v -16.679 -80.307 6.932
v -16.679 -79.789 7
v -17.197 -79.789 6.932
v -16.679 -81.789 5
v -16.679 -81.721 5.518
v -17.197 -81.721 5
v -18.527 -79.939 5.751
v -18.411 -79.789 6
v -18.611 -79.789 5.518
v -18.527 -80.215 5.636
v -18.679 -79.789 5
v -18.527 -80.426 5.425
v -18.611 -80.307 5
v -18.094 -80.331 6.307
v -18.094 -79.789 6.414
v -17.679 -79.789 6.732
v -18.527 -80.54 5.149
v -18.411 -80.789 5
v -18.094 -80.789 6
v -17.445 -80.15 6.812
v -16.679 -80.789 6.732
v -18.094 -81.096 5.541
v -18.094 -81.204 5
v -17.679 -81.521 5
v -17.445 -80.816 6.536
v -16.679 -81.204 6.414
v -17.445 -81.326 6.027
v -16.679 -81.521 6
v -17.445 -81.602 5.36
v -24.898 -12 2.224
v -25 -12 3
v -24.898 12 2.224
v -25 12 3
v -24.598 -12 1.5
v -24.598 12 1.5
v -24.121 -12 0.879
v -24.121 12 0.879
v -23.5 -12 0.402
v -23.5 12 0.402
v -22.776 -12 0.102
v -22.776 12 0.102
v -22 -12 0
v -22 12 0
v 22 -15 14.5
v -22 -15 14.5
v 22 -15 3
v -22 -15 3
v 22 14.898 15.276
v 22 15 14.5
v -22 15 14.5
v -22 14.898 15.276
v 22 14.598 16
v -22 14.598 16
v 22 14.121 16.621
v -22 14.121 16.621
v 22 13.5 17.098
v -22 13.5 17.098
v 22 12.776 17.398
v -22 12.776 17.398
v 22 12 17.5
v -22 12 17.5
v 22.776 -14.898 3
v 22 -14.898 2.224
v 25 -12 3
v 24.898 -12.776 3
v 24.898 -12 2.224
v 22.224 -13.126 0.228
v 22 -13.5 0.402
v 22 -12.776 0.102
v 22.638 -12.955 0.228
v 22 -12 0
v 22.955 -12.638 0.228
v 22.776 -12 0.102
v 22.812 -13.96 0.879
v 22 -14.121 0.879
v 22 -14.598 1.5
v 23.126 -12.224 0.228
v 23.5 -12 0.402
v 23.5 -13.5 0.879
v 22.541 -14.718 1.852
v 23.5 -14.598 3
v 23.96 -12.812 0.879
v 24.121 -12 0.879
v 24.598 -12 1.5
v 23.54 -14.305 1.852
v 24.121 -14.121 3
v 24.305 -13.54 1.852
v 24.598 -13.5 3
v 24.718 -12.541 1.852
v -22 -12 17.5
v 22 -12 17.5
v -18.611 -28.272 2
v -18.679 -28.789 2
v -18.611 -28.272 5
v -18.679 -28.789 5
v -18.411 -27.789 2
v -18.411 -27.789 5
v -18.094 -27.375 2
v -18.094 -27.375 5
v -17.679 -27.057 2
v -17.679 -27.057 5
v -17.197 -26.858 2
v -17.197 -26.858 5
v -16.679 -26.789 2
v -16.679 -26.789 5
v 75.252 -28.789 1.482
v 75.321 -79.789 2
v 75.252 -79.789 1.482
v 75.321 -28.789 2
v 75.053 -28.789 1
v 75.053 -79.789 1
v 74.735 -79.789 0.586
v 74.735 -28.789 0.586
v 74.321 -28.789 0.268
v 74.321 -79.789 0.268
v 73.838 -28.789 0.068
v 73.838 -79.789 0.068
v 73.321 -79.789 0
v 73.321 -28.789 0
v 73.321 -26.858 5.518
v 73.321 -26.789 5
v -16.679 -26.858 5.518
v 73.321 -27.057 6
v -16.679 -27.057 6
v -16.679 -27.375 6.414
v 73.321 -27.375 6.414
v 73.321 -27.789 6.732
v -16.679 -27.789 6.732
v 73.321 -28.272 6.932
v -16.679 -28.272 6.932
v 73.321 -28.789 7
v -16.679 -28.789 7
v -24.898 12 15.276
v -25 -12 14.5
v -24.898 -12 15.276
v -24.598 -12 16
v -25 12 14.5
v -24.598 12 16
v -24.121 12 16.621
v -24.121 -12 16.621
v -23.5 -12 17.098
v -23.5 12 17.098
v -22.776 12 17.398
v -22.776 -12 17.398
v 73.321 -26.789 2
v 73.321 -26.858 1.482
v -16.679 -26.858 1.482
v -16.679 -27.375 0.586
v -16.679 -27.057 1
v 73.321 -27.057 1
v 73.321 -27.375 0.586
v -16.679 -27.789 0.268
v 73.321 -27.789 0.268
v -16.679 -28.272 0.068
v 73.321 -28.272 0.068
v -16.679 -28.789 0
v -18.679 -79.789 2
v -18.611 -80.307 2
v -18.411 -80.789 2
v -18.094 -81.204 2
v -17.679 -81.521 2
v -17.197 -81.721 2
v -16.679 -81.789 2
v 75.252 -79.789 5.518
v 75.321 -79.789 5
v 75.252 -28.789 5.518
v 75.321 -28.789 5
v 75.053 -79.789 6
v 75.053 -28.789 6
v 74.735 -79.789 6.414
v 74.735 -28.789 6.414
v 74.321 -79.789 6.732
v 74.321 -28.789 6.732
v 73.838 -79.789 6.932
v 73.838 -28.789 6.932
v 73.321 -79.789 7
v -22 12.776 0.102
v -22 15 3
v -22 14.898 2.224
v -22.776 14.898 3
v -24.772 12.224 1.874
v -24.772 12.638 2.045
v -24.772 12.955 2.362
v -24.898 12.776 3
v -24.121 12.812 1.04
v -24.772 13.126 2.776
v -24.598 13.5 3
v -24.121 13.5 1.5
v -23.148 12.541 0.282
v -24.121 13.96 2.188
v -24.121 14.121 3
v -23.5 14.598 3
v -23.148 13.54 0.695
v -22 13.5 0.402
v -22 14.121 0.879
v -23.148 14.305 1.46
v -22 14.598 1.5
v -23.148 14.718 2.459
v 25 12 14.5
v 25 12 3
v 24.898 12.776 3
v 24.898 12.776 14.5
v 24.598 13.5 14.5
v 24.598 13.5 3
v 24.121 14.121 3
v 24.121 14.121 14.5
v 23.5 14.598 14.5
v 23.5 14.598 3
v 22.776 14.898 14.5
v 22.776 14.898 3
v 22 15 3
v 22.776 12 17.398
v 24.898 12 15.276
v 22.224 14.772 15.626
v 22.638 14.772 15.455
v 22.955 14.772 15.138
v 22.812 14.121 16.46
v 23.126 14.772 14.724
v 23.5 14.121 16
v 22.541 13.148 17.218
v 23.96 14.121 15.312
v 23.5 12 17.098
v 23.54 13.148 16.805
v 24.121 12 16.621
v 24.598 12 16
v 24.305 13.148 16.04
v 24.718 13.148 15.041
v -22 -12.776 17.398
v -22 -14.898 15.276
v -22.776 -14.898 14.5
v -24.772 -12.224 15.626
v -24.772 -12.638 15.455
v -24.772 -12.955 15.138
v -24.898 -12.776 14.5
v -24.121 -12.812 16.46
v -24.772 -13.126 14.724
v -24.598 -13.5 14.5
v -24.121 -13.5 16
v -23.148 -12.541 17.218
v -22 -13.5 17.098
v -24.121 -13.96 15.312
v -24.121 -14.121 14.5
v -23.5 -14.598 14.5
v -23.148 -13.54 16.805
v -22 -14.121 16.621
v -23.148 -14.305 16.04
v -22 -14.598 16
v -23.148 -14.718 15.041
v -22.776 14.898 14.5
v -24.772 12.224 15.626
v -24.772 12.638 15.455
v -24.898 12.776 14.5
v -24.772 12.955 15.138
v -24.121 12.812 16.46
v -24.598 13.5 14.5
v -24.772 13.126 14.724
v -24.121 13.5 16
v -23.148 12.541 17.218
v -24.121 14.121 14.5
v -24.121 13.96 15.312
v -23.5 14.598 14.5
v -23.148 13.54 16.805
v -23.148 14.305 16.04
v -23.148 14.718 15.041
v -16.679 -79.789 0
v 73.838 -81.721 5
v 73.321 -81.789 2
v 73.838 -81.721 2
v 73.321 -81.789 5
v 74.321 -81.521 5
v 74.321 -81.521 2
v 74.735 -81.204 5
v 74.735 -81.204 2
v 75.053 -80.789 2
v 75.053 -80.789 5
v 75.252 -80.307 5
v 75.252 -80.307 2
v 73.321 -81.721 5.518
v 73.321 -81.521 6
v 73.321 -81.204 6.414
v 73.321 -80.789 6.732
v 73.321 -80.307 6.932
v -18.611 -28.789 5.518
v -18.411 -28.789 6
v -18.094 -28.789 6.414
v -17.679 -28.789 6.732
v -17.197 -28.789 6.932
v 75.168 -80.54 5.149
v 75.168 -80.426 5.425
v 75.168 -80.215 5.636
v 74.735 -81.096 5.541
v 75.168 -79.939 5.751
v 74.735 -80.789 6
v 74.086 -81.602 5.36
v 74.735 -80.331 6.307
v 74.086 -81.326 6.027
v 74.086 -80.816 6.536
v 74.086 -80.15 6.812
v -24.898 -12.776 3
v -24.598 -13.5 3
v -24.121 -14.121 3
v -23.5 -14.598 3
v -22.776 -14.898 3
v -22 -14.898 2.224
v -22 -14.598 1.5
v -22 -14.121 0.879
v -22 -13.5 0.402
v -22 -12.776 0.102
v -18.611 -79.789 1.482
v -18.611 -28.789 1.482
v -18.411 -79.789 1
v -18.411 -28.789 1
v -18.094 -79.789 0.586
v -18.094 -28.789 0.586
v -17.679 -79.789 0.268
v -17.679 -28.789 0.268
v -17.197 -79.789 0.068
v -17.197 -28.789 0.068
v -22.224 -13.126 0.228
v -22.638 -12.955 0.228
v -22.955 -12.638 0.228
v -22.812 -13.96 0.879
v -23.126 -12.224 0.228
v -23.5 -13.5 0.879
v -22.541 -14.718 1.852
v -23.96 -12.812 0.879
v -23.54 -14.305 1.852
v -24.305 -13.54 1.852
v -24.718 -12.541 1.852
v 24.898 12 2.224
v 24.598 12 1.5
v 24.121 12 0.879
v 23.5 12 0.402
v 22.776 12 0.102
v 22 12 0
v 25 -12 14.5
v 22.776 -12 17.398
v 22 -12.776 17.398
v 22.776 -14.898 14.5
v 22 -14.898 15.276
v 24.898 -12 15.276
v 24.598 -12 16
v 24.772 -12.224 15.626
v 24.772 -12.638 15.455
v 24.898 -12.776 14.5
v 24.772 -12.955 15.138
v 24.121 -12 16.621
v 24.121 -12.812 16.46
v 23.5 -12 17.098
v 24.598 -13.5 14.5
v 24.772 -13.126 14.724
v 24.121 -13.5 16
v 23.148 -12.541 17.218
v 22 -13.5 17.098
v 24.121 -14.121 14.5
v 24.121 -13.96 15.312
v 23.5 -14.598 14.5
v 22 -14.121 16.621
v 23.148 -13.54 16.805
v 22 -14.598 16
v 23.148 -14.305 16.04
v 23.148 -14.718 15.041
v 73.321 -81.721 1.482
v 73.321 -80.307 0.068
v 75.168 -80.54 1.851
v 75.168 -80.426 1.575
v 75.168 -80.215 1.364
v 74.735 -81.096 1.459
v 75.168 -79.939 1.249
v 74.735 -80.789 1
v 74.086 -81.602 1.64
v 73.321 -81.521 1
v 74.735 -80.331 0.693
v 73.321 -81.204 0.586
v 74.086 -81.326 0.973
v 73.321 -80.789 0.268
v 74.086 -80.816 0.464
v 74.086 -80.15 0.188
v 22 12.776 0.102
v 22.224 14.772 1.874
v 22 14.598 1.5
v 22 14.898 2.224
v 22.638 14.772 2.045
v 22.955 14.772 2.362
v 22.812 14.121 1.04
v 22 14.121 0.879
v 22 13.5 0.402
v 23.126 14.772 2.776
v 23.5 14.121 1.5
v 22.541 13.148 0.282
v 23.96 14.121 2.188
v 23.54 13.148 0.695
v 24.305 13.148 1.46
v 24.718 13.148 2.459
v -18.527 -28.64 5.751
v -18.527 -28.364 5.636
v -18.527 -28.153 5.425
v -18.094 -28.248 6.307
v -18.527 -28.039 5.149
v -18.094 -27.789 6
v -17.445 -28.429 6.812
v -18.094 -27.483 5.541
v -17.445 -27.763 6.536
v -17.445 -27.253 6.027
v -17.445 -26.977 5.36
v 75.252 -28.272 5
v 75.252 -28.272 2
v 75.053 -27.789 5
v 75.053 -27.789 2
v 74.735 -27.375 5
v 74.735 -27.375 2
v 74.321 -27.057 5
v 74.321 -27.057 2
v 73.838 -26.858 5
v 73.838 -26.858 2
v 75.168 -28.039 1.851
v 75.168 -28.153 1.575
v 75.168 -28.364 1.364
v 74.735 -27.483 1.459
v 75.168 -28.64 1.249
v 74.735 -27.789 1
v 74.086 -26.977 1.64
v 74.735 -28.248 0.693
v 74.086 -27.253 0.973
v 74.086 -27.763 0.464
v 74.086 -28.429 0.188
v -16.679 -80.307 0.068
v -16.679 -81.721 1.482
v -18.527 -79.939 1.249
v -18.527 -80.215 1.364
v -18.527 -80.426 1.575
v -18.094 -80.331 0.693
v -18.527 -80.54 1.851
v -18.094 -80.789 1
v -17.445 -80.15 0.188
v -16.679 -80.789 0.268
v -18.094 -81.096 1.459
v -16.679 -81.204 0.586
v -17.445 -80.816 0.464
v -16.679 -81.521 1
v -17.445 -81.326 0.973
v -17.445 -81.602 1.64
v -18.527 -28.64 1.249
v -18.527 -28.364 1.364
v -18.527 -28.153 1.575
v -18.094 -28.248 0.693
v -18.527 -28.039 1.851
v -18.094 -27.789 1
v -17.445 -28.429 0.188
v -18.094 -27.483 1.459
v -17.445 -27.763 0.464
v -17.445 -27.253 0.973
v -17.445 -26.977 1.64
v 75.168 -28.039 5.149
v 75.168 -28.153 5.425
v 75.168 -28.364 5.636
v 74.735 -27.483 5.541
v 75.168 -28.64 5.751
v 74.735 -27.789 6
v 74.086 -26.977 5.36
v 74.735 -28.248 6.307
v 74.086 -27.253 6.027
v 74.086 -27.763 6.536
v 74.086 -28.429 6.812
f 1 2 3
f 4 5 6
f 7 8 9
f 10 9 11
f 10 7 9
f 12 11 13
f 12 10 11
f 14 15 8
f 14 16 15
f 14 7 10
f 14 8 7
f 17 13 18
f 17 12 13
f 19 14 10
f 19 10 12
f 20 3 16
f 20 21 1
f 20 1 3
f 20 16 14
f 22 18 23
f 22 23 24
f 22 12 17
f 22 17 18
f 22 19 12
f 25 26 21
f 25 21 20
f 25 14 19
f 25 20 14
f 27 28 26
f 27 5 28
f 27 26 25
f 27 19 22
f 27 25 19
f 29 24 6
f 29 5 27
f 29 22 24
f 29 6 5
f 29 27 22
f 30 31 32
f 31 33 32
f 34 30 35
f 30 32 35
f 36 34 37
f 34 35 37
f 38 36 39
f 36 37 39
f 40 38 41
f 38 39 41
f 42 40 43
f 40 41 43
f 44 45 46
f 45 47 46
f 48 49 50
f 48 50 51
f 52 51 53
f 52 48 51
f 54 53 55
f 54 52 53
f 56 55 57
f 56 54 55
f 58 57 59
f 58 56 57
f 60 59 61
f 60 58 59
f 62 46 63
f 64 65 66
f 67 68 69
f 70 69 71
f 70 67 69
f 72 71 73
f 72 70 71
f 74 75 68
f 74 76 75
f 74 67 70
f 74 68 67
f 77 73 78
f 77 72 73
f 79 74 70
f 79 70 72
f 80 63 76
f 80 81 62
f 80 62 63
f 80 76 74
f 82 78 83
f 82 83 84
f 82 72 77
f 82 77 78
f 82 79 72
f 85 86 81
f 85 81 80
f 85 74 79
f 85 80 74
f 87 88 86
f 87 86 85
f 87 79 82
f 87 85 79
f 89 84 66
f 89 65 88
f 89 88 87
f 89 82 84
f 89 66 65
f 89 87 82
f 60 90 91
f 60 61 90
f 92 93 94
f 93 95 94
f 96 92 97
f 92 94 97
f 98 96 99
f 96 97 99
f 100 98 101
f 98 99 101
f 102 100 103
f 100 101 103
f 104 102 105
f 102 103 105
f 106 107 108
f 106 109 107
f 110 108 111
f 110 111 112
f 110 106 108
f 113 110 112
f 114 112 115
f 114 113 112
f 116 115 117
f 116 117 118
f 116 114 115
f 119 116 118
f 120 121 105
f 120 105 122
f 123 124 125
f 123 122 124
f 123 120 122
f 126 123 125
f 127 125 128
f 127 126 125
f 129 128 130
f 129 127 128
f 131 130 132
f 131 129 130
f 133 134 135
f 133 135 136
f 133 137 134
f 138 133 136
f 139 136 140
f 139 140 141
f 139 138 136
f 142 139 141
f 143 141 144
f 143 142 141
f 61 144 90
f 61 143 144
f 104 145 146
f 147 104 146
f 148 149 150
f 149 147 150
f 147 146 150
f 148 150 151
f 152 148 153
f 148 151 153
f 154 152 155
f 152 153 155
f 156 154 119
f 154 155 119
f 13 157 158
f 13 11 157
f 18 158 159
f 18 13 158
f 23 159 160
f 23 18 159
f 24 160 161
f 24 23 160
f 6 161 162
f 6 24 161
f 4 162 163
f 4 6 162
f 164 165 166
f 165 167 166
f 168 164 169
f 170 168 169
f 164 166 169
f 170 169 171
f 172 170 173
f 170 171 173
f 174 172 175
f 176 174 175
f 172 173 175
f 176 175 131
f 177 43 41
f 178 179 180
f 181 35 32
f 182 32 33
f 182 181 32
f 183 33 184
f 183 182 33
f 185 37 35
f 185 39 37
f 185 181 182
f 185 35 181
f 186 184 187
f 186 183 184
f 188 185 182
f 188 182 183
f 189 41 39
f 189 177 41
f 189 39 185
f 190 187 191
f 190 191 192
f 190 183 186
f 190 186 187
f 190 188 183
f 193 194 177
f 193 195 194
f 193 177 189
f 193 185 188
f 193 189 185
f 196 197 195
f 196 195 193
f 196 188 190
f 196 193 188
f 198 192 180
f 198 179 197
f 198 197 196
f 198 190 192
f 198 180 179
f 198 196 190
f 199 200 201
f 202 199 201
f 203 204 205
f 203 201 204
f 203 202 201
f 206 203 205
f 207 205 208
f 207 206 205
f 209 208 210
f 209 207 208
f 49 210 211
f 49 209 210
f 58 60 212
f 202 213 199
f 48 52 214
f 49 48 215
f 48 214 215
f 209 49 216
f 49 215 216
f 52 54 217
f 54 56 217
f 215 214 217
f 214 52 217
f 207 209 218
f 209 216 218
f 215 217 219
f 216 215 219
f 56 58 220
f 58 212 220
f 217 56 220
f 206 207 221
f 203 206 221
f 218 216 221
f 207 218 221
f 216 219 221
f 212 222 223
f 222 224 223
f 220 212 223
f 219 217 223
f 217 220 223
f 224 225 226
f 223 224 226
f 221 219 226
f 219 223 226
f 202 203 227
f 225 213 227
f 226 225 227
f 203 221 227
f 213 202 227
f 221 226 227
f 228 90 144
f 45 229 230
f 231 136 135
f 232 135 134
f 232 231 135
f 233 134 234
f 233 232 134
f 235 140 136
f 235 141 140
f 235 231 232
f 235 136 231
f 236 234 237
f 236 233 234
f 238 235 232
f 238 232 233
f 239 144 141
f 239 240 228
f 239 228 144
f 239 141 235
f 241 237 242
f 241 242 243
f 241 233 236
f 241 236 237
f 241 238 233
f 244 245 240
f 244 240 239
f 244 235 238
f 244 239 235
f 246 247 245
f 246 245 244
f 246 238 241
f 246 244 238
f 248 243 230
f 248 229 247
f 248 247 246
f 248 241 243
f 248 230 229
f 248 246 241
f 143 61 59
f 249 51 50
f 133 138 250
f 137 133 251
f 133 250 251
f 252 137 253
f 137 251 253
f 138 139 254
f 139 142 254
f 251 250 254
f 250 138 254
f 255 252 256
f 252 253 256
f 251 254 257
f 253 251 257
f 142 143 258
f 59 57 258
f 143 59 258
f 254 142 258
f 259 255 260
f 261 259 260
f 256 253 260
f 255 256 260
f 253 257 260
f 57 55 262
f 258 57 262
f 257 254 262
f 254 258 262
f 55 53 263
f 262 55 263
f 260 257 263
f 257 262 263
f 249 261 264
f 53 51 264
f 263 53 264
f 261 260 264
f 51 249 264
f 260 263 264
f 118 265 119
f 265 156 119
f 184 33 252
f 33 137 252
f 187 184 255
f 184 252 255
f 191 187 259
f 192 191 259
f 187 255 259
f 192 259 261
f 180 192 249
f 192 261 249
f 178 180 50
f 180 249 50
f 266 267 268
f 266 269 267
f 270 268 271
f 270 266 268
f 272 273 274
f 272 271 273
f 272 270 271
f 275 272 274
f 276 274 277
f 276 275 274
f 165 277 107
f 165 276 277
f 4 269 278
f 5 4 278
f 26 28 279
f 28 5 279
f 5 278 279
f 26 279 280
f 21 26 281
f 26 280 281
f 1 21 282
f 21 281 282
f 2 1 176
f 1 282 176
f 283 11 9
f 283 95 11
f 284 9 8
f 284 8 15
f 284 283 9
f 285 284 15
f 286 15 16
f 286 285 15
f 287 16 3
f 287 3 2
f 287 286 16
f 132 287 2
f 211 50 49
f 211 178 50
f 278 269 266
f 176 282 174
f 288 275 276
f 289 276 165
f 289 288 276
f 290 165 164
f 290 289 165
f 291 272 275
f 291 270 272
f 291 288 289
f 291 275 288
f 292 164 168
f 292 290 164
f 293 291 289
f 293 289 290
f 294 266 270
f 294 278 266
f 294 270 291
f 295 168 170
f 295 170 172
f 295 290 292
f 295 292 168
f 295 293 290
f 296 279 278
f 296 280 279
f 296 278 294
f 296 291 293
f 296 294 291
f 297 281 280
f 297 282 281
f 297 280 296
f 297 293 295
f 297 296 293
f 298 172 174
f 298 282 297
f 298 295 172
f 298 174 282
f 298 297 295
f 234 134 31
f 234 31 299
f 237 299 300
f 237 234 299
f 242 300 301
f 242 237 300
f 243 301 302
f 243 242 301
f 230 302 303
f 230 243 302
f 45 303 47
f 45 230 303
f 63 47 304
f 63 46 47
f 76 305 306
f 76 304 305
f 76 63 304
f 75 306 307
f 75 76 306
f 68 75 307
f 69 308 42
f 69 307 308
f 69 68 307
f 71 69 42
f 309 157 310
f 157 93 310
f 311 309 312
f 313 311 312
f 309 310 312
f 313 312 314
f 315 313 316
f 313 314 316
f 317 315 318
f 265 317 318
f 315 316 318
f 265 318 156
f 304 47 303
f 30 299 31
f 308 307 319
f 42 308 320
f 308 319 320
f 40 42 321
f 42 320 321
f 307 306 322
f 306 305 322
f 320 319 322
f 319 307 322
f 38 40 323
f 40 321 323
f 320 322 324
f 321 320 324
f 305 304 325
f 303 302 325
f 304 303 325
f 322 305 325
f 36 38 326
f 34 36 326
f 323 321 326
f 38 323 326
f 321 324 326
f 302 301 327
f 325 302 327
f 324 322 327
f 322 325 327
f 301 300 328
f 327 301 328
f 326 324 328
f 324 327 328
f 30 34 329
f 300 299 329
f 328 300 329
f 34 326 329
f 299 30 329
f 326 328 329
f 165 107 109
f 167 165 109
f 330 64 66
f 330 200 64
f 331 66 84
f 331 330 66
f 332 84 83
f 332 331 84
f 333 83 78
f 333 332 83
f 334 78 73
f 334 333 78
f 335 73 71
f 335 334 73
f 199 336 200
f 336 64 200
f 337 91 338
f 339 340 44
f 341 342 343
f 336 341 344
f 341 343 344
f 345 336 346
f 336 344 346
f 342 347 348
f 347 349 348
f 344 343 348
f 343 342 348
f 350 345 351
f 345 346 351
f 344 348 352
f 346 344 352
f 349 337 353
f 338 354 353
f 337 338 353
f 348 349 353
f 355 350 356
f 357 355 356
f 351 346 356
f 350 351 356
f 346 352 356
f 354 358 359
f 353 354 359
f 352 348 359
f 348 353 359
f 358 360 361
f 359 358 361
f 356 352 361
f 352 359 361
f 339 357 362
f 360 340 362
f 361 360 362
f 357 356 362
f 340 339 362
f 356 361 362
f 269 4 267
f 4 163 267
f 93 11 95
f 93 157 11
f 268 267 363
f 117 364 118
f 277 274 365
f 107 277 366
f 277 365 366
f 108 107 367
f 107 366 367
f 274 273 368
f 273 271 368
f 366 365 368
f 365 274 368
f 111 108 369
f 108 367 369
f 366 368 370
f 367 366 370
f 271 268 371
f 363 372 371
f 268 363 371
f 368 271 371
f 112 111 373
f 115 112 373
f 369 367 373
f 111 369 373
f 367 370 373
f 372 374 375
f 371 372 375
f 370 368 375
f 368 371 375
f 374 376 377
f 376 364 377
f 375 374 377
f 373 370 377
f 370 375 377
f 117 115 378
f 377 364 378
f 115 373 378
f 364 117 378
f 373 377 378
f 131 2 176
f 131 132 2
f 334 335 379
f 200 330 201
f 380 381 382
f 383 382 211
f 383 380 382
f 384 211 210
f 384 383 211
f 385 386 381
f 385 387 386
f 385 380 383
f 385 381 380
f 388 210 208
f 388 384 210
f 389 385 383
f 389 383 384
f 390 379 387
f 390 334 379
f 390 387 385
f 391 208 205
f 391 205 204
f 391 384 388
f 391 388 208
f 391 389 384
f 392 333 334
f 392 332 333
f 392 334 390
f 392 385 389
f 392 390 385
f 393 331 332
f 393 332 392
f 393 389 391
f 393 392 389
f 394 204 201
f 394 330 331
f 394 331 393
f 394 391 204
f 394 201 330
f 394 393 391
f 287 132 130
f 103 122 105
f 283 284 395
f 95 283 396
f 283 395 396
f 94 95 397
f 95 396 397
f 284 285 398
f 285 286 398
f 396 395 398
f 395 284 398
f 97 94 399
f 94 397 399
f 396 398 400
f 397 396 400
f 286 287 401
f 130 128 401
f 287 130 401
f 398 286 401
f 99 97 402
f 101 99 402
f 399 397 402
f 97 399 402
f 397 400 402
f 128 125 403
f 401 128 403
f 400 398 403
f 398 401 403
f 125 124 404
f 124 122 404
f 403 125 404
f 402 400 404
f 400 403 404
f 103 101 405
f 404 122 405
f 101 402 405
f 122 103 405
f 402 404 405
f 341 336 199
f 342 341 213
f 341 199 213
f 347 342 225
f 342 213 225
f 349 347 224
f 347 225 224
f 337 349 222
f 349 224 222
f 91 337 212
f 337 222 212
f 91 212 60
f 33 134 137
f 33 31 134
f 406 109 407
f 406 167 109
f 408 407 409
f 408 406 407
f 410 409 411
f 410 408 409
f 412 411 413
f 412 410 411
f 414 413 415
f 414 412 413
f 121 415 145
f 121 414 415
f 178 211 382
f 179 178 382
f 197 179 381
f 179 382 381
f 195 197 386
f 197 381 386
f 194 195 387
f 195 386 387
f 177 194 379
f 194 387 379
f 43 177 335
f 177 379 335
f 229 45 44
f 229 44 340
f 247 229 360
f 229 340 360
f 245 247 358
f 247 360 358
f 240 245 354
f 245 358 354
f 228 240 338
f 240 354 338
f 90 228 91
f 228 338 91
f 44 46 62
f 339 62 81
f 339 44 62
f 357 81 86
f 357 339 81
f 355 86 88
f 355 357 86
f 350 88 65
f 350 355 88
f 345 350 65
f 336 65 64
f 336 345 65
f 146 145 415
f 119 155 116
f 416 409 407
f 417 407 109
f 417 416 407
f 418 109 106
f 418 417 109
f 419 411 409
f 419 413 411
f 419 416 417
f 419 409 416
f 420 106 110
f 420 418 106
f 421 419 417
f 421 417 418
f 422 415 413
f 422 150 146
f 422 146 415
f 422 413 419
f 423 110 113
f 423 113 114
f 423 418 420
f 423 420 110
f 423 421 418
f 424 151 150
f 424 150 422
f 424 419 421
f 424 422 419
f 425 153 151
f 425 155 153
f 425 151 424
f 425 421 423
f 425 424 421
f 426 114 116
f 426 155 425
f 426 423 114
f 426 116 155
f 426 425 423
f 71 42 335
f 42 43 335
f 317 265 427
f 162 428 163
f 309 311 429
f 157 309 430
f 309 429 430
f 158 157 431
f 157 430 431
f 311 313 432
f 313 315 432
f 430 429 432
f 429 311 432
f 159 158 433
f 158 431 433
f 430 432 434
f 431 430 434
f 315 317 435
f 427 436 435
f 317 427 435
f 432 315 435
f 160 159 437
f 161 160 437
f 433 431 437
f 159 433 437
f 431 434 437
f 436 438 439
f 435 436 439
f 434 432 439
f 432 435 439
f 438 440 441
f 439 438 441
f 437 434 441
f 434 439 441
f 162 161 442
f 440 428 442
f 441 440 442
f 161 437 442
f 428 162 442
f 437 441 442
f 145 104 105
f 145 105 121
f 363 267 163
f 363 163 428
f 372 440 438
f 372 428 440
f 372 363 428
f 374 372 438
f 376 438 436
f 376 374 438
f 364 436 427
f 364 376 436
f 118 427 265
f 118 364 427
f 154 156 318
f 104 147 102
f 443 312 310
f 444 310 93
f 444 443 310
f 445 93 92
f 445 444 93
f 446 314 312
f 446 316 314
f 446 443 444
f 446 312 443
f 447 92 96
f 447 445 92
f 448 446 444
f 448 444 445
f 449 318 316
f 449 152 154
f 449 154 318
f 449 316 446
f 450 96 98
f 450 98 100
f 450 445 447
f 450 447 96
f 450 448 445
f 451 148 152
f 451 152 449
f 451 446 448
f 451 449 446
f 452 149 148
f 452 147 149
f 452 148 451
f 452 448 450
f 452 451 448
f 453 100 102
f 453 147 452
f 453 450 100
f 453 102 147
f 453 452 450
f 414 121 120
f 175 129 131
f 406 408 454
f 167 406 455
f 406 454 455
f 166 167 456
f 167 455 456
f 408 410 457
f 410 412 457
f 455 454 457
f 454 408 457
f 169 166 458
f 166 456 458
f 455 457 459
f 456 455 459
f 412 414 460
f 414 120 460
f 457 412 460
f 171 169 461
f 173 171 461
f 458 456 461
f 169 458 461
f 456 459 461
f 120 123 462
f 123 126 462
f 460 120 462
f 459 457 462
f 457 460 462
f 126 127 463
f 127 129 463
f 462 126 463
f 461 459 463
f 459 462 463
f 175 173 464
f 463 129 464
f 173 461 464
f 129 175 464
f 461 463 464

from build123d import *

# Parameters (mm, degrees)
F0_W     = 50
F0_H     = 30
F1_DEPTH = 17.5
F2_R     = 3
F3_W     = 94
F3_H     = 55
F4_DEPTH = 7
F5_R     = 2


with BuildPart() as f1:
    # F0 (on Top) → F1 (new body)
    with BuildSketch(Plane.XY):
        Rectangle(F0_W, F0_H)
    extrude(amount=F1_DEPTH)

    # F2
    f2_edges = [f1.edges().sort_by_distance(p)[0] for p in [
        (0, -15, 17.5),
        (25, 0, 17.5),
        (0, 15, 17.5),
        (-25, 0, 17.5),
        (-25, -15, 8.75),
        (25, -15, 8.75),
        (0, -15, 0),
        (25, 0, 0),
        (0, 15, 0),
        (-25, 0, 0),
        (25, 15, 8.75),
        (-25, 15, 8.75),
    ]]
    fillet(f2_edges, radius=F2_R)


with BuildPart() as f4:
    # F3 (on Top) → F4 (new body)
    with BuildSketch(Plane.XY):
        with Locations((28.320593, -54.28942)):
            Rectangle(F3_W, F3_H)
    extrude(amount=F4_DEPTH)

    # F5
    f5_edges = [f4.edges().sort_by_distance(p)[0] for p in [
        (28.320593, -81.78942, 7),
        (28.320593, -81.78942, 0),
        (28.320593, -26.78942, 0),
        (28.320593, -26.78942, 7),
        (75.320593, -26.78942, 3.5),
        (75.320593, -81.78942, 3.5),
        (75.320593, -54.28942, 7),
        (75.320593, -54.28942, 0),
        (-18.679407, -54.28942, 7),
        (-18.679407, -54.28942, 0),
        (-18.679407, -26.78942, 3.5),
        (-18.679407, -81.78942, 3.5),
    ]]
    fillet(f5_edges, radius=F5_R)


solid = Compound([f1.part, f4.part])
